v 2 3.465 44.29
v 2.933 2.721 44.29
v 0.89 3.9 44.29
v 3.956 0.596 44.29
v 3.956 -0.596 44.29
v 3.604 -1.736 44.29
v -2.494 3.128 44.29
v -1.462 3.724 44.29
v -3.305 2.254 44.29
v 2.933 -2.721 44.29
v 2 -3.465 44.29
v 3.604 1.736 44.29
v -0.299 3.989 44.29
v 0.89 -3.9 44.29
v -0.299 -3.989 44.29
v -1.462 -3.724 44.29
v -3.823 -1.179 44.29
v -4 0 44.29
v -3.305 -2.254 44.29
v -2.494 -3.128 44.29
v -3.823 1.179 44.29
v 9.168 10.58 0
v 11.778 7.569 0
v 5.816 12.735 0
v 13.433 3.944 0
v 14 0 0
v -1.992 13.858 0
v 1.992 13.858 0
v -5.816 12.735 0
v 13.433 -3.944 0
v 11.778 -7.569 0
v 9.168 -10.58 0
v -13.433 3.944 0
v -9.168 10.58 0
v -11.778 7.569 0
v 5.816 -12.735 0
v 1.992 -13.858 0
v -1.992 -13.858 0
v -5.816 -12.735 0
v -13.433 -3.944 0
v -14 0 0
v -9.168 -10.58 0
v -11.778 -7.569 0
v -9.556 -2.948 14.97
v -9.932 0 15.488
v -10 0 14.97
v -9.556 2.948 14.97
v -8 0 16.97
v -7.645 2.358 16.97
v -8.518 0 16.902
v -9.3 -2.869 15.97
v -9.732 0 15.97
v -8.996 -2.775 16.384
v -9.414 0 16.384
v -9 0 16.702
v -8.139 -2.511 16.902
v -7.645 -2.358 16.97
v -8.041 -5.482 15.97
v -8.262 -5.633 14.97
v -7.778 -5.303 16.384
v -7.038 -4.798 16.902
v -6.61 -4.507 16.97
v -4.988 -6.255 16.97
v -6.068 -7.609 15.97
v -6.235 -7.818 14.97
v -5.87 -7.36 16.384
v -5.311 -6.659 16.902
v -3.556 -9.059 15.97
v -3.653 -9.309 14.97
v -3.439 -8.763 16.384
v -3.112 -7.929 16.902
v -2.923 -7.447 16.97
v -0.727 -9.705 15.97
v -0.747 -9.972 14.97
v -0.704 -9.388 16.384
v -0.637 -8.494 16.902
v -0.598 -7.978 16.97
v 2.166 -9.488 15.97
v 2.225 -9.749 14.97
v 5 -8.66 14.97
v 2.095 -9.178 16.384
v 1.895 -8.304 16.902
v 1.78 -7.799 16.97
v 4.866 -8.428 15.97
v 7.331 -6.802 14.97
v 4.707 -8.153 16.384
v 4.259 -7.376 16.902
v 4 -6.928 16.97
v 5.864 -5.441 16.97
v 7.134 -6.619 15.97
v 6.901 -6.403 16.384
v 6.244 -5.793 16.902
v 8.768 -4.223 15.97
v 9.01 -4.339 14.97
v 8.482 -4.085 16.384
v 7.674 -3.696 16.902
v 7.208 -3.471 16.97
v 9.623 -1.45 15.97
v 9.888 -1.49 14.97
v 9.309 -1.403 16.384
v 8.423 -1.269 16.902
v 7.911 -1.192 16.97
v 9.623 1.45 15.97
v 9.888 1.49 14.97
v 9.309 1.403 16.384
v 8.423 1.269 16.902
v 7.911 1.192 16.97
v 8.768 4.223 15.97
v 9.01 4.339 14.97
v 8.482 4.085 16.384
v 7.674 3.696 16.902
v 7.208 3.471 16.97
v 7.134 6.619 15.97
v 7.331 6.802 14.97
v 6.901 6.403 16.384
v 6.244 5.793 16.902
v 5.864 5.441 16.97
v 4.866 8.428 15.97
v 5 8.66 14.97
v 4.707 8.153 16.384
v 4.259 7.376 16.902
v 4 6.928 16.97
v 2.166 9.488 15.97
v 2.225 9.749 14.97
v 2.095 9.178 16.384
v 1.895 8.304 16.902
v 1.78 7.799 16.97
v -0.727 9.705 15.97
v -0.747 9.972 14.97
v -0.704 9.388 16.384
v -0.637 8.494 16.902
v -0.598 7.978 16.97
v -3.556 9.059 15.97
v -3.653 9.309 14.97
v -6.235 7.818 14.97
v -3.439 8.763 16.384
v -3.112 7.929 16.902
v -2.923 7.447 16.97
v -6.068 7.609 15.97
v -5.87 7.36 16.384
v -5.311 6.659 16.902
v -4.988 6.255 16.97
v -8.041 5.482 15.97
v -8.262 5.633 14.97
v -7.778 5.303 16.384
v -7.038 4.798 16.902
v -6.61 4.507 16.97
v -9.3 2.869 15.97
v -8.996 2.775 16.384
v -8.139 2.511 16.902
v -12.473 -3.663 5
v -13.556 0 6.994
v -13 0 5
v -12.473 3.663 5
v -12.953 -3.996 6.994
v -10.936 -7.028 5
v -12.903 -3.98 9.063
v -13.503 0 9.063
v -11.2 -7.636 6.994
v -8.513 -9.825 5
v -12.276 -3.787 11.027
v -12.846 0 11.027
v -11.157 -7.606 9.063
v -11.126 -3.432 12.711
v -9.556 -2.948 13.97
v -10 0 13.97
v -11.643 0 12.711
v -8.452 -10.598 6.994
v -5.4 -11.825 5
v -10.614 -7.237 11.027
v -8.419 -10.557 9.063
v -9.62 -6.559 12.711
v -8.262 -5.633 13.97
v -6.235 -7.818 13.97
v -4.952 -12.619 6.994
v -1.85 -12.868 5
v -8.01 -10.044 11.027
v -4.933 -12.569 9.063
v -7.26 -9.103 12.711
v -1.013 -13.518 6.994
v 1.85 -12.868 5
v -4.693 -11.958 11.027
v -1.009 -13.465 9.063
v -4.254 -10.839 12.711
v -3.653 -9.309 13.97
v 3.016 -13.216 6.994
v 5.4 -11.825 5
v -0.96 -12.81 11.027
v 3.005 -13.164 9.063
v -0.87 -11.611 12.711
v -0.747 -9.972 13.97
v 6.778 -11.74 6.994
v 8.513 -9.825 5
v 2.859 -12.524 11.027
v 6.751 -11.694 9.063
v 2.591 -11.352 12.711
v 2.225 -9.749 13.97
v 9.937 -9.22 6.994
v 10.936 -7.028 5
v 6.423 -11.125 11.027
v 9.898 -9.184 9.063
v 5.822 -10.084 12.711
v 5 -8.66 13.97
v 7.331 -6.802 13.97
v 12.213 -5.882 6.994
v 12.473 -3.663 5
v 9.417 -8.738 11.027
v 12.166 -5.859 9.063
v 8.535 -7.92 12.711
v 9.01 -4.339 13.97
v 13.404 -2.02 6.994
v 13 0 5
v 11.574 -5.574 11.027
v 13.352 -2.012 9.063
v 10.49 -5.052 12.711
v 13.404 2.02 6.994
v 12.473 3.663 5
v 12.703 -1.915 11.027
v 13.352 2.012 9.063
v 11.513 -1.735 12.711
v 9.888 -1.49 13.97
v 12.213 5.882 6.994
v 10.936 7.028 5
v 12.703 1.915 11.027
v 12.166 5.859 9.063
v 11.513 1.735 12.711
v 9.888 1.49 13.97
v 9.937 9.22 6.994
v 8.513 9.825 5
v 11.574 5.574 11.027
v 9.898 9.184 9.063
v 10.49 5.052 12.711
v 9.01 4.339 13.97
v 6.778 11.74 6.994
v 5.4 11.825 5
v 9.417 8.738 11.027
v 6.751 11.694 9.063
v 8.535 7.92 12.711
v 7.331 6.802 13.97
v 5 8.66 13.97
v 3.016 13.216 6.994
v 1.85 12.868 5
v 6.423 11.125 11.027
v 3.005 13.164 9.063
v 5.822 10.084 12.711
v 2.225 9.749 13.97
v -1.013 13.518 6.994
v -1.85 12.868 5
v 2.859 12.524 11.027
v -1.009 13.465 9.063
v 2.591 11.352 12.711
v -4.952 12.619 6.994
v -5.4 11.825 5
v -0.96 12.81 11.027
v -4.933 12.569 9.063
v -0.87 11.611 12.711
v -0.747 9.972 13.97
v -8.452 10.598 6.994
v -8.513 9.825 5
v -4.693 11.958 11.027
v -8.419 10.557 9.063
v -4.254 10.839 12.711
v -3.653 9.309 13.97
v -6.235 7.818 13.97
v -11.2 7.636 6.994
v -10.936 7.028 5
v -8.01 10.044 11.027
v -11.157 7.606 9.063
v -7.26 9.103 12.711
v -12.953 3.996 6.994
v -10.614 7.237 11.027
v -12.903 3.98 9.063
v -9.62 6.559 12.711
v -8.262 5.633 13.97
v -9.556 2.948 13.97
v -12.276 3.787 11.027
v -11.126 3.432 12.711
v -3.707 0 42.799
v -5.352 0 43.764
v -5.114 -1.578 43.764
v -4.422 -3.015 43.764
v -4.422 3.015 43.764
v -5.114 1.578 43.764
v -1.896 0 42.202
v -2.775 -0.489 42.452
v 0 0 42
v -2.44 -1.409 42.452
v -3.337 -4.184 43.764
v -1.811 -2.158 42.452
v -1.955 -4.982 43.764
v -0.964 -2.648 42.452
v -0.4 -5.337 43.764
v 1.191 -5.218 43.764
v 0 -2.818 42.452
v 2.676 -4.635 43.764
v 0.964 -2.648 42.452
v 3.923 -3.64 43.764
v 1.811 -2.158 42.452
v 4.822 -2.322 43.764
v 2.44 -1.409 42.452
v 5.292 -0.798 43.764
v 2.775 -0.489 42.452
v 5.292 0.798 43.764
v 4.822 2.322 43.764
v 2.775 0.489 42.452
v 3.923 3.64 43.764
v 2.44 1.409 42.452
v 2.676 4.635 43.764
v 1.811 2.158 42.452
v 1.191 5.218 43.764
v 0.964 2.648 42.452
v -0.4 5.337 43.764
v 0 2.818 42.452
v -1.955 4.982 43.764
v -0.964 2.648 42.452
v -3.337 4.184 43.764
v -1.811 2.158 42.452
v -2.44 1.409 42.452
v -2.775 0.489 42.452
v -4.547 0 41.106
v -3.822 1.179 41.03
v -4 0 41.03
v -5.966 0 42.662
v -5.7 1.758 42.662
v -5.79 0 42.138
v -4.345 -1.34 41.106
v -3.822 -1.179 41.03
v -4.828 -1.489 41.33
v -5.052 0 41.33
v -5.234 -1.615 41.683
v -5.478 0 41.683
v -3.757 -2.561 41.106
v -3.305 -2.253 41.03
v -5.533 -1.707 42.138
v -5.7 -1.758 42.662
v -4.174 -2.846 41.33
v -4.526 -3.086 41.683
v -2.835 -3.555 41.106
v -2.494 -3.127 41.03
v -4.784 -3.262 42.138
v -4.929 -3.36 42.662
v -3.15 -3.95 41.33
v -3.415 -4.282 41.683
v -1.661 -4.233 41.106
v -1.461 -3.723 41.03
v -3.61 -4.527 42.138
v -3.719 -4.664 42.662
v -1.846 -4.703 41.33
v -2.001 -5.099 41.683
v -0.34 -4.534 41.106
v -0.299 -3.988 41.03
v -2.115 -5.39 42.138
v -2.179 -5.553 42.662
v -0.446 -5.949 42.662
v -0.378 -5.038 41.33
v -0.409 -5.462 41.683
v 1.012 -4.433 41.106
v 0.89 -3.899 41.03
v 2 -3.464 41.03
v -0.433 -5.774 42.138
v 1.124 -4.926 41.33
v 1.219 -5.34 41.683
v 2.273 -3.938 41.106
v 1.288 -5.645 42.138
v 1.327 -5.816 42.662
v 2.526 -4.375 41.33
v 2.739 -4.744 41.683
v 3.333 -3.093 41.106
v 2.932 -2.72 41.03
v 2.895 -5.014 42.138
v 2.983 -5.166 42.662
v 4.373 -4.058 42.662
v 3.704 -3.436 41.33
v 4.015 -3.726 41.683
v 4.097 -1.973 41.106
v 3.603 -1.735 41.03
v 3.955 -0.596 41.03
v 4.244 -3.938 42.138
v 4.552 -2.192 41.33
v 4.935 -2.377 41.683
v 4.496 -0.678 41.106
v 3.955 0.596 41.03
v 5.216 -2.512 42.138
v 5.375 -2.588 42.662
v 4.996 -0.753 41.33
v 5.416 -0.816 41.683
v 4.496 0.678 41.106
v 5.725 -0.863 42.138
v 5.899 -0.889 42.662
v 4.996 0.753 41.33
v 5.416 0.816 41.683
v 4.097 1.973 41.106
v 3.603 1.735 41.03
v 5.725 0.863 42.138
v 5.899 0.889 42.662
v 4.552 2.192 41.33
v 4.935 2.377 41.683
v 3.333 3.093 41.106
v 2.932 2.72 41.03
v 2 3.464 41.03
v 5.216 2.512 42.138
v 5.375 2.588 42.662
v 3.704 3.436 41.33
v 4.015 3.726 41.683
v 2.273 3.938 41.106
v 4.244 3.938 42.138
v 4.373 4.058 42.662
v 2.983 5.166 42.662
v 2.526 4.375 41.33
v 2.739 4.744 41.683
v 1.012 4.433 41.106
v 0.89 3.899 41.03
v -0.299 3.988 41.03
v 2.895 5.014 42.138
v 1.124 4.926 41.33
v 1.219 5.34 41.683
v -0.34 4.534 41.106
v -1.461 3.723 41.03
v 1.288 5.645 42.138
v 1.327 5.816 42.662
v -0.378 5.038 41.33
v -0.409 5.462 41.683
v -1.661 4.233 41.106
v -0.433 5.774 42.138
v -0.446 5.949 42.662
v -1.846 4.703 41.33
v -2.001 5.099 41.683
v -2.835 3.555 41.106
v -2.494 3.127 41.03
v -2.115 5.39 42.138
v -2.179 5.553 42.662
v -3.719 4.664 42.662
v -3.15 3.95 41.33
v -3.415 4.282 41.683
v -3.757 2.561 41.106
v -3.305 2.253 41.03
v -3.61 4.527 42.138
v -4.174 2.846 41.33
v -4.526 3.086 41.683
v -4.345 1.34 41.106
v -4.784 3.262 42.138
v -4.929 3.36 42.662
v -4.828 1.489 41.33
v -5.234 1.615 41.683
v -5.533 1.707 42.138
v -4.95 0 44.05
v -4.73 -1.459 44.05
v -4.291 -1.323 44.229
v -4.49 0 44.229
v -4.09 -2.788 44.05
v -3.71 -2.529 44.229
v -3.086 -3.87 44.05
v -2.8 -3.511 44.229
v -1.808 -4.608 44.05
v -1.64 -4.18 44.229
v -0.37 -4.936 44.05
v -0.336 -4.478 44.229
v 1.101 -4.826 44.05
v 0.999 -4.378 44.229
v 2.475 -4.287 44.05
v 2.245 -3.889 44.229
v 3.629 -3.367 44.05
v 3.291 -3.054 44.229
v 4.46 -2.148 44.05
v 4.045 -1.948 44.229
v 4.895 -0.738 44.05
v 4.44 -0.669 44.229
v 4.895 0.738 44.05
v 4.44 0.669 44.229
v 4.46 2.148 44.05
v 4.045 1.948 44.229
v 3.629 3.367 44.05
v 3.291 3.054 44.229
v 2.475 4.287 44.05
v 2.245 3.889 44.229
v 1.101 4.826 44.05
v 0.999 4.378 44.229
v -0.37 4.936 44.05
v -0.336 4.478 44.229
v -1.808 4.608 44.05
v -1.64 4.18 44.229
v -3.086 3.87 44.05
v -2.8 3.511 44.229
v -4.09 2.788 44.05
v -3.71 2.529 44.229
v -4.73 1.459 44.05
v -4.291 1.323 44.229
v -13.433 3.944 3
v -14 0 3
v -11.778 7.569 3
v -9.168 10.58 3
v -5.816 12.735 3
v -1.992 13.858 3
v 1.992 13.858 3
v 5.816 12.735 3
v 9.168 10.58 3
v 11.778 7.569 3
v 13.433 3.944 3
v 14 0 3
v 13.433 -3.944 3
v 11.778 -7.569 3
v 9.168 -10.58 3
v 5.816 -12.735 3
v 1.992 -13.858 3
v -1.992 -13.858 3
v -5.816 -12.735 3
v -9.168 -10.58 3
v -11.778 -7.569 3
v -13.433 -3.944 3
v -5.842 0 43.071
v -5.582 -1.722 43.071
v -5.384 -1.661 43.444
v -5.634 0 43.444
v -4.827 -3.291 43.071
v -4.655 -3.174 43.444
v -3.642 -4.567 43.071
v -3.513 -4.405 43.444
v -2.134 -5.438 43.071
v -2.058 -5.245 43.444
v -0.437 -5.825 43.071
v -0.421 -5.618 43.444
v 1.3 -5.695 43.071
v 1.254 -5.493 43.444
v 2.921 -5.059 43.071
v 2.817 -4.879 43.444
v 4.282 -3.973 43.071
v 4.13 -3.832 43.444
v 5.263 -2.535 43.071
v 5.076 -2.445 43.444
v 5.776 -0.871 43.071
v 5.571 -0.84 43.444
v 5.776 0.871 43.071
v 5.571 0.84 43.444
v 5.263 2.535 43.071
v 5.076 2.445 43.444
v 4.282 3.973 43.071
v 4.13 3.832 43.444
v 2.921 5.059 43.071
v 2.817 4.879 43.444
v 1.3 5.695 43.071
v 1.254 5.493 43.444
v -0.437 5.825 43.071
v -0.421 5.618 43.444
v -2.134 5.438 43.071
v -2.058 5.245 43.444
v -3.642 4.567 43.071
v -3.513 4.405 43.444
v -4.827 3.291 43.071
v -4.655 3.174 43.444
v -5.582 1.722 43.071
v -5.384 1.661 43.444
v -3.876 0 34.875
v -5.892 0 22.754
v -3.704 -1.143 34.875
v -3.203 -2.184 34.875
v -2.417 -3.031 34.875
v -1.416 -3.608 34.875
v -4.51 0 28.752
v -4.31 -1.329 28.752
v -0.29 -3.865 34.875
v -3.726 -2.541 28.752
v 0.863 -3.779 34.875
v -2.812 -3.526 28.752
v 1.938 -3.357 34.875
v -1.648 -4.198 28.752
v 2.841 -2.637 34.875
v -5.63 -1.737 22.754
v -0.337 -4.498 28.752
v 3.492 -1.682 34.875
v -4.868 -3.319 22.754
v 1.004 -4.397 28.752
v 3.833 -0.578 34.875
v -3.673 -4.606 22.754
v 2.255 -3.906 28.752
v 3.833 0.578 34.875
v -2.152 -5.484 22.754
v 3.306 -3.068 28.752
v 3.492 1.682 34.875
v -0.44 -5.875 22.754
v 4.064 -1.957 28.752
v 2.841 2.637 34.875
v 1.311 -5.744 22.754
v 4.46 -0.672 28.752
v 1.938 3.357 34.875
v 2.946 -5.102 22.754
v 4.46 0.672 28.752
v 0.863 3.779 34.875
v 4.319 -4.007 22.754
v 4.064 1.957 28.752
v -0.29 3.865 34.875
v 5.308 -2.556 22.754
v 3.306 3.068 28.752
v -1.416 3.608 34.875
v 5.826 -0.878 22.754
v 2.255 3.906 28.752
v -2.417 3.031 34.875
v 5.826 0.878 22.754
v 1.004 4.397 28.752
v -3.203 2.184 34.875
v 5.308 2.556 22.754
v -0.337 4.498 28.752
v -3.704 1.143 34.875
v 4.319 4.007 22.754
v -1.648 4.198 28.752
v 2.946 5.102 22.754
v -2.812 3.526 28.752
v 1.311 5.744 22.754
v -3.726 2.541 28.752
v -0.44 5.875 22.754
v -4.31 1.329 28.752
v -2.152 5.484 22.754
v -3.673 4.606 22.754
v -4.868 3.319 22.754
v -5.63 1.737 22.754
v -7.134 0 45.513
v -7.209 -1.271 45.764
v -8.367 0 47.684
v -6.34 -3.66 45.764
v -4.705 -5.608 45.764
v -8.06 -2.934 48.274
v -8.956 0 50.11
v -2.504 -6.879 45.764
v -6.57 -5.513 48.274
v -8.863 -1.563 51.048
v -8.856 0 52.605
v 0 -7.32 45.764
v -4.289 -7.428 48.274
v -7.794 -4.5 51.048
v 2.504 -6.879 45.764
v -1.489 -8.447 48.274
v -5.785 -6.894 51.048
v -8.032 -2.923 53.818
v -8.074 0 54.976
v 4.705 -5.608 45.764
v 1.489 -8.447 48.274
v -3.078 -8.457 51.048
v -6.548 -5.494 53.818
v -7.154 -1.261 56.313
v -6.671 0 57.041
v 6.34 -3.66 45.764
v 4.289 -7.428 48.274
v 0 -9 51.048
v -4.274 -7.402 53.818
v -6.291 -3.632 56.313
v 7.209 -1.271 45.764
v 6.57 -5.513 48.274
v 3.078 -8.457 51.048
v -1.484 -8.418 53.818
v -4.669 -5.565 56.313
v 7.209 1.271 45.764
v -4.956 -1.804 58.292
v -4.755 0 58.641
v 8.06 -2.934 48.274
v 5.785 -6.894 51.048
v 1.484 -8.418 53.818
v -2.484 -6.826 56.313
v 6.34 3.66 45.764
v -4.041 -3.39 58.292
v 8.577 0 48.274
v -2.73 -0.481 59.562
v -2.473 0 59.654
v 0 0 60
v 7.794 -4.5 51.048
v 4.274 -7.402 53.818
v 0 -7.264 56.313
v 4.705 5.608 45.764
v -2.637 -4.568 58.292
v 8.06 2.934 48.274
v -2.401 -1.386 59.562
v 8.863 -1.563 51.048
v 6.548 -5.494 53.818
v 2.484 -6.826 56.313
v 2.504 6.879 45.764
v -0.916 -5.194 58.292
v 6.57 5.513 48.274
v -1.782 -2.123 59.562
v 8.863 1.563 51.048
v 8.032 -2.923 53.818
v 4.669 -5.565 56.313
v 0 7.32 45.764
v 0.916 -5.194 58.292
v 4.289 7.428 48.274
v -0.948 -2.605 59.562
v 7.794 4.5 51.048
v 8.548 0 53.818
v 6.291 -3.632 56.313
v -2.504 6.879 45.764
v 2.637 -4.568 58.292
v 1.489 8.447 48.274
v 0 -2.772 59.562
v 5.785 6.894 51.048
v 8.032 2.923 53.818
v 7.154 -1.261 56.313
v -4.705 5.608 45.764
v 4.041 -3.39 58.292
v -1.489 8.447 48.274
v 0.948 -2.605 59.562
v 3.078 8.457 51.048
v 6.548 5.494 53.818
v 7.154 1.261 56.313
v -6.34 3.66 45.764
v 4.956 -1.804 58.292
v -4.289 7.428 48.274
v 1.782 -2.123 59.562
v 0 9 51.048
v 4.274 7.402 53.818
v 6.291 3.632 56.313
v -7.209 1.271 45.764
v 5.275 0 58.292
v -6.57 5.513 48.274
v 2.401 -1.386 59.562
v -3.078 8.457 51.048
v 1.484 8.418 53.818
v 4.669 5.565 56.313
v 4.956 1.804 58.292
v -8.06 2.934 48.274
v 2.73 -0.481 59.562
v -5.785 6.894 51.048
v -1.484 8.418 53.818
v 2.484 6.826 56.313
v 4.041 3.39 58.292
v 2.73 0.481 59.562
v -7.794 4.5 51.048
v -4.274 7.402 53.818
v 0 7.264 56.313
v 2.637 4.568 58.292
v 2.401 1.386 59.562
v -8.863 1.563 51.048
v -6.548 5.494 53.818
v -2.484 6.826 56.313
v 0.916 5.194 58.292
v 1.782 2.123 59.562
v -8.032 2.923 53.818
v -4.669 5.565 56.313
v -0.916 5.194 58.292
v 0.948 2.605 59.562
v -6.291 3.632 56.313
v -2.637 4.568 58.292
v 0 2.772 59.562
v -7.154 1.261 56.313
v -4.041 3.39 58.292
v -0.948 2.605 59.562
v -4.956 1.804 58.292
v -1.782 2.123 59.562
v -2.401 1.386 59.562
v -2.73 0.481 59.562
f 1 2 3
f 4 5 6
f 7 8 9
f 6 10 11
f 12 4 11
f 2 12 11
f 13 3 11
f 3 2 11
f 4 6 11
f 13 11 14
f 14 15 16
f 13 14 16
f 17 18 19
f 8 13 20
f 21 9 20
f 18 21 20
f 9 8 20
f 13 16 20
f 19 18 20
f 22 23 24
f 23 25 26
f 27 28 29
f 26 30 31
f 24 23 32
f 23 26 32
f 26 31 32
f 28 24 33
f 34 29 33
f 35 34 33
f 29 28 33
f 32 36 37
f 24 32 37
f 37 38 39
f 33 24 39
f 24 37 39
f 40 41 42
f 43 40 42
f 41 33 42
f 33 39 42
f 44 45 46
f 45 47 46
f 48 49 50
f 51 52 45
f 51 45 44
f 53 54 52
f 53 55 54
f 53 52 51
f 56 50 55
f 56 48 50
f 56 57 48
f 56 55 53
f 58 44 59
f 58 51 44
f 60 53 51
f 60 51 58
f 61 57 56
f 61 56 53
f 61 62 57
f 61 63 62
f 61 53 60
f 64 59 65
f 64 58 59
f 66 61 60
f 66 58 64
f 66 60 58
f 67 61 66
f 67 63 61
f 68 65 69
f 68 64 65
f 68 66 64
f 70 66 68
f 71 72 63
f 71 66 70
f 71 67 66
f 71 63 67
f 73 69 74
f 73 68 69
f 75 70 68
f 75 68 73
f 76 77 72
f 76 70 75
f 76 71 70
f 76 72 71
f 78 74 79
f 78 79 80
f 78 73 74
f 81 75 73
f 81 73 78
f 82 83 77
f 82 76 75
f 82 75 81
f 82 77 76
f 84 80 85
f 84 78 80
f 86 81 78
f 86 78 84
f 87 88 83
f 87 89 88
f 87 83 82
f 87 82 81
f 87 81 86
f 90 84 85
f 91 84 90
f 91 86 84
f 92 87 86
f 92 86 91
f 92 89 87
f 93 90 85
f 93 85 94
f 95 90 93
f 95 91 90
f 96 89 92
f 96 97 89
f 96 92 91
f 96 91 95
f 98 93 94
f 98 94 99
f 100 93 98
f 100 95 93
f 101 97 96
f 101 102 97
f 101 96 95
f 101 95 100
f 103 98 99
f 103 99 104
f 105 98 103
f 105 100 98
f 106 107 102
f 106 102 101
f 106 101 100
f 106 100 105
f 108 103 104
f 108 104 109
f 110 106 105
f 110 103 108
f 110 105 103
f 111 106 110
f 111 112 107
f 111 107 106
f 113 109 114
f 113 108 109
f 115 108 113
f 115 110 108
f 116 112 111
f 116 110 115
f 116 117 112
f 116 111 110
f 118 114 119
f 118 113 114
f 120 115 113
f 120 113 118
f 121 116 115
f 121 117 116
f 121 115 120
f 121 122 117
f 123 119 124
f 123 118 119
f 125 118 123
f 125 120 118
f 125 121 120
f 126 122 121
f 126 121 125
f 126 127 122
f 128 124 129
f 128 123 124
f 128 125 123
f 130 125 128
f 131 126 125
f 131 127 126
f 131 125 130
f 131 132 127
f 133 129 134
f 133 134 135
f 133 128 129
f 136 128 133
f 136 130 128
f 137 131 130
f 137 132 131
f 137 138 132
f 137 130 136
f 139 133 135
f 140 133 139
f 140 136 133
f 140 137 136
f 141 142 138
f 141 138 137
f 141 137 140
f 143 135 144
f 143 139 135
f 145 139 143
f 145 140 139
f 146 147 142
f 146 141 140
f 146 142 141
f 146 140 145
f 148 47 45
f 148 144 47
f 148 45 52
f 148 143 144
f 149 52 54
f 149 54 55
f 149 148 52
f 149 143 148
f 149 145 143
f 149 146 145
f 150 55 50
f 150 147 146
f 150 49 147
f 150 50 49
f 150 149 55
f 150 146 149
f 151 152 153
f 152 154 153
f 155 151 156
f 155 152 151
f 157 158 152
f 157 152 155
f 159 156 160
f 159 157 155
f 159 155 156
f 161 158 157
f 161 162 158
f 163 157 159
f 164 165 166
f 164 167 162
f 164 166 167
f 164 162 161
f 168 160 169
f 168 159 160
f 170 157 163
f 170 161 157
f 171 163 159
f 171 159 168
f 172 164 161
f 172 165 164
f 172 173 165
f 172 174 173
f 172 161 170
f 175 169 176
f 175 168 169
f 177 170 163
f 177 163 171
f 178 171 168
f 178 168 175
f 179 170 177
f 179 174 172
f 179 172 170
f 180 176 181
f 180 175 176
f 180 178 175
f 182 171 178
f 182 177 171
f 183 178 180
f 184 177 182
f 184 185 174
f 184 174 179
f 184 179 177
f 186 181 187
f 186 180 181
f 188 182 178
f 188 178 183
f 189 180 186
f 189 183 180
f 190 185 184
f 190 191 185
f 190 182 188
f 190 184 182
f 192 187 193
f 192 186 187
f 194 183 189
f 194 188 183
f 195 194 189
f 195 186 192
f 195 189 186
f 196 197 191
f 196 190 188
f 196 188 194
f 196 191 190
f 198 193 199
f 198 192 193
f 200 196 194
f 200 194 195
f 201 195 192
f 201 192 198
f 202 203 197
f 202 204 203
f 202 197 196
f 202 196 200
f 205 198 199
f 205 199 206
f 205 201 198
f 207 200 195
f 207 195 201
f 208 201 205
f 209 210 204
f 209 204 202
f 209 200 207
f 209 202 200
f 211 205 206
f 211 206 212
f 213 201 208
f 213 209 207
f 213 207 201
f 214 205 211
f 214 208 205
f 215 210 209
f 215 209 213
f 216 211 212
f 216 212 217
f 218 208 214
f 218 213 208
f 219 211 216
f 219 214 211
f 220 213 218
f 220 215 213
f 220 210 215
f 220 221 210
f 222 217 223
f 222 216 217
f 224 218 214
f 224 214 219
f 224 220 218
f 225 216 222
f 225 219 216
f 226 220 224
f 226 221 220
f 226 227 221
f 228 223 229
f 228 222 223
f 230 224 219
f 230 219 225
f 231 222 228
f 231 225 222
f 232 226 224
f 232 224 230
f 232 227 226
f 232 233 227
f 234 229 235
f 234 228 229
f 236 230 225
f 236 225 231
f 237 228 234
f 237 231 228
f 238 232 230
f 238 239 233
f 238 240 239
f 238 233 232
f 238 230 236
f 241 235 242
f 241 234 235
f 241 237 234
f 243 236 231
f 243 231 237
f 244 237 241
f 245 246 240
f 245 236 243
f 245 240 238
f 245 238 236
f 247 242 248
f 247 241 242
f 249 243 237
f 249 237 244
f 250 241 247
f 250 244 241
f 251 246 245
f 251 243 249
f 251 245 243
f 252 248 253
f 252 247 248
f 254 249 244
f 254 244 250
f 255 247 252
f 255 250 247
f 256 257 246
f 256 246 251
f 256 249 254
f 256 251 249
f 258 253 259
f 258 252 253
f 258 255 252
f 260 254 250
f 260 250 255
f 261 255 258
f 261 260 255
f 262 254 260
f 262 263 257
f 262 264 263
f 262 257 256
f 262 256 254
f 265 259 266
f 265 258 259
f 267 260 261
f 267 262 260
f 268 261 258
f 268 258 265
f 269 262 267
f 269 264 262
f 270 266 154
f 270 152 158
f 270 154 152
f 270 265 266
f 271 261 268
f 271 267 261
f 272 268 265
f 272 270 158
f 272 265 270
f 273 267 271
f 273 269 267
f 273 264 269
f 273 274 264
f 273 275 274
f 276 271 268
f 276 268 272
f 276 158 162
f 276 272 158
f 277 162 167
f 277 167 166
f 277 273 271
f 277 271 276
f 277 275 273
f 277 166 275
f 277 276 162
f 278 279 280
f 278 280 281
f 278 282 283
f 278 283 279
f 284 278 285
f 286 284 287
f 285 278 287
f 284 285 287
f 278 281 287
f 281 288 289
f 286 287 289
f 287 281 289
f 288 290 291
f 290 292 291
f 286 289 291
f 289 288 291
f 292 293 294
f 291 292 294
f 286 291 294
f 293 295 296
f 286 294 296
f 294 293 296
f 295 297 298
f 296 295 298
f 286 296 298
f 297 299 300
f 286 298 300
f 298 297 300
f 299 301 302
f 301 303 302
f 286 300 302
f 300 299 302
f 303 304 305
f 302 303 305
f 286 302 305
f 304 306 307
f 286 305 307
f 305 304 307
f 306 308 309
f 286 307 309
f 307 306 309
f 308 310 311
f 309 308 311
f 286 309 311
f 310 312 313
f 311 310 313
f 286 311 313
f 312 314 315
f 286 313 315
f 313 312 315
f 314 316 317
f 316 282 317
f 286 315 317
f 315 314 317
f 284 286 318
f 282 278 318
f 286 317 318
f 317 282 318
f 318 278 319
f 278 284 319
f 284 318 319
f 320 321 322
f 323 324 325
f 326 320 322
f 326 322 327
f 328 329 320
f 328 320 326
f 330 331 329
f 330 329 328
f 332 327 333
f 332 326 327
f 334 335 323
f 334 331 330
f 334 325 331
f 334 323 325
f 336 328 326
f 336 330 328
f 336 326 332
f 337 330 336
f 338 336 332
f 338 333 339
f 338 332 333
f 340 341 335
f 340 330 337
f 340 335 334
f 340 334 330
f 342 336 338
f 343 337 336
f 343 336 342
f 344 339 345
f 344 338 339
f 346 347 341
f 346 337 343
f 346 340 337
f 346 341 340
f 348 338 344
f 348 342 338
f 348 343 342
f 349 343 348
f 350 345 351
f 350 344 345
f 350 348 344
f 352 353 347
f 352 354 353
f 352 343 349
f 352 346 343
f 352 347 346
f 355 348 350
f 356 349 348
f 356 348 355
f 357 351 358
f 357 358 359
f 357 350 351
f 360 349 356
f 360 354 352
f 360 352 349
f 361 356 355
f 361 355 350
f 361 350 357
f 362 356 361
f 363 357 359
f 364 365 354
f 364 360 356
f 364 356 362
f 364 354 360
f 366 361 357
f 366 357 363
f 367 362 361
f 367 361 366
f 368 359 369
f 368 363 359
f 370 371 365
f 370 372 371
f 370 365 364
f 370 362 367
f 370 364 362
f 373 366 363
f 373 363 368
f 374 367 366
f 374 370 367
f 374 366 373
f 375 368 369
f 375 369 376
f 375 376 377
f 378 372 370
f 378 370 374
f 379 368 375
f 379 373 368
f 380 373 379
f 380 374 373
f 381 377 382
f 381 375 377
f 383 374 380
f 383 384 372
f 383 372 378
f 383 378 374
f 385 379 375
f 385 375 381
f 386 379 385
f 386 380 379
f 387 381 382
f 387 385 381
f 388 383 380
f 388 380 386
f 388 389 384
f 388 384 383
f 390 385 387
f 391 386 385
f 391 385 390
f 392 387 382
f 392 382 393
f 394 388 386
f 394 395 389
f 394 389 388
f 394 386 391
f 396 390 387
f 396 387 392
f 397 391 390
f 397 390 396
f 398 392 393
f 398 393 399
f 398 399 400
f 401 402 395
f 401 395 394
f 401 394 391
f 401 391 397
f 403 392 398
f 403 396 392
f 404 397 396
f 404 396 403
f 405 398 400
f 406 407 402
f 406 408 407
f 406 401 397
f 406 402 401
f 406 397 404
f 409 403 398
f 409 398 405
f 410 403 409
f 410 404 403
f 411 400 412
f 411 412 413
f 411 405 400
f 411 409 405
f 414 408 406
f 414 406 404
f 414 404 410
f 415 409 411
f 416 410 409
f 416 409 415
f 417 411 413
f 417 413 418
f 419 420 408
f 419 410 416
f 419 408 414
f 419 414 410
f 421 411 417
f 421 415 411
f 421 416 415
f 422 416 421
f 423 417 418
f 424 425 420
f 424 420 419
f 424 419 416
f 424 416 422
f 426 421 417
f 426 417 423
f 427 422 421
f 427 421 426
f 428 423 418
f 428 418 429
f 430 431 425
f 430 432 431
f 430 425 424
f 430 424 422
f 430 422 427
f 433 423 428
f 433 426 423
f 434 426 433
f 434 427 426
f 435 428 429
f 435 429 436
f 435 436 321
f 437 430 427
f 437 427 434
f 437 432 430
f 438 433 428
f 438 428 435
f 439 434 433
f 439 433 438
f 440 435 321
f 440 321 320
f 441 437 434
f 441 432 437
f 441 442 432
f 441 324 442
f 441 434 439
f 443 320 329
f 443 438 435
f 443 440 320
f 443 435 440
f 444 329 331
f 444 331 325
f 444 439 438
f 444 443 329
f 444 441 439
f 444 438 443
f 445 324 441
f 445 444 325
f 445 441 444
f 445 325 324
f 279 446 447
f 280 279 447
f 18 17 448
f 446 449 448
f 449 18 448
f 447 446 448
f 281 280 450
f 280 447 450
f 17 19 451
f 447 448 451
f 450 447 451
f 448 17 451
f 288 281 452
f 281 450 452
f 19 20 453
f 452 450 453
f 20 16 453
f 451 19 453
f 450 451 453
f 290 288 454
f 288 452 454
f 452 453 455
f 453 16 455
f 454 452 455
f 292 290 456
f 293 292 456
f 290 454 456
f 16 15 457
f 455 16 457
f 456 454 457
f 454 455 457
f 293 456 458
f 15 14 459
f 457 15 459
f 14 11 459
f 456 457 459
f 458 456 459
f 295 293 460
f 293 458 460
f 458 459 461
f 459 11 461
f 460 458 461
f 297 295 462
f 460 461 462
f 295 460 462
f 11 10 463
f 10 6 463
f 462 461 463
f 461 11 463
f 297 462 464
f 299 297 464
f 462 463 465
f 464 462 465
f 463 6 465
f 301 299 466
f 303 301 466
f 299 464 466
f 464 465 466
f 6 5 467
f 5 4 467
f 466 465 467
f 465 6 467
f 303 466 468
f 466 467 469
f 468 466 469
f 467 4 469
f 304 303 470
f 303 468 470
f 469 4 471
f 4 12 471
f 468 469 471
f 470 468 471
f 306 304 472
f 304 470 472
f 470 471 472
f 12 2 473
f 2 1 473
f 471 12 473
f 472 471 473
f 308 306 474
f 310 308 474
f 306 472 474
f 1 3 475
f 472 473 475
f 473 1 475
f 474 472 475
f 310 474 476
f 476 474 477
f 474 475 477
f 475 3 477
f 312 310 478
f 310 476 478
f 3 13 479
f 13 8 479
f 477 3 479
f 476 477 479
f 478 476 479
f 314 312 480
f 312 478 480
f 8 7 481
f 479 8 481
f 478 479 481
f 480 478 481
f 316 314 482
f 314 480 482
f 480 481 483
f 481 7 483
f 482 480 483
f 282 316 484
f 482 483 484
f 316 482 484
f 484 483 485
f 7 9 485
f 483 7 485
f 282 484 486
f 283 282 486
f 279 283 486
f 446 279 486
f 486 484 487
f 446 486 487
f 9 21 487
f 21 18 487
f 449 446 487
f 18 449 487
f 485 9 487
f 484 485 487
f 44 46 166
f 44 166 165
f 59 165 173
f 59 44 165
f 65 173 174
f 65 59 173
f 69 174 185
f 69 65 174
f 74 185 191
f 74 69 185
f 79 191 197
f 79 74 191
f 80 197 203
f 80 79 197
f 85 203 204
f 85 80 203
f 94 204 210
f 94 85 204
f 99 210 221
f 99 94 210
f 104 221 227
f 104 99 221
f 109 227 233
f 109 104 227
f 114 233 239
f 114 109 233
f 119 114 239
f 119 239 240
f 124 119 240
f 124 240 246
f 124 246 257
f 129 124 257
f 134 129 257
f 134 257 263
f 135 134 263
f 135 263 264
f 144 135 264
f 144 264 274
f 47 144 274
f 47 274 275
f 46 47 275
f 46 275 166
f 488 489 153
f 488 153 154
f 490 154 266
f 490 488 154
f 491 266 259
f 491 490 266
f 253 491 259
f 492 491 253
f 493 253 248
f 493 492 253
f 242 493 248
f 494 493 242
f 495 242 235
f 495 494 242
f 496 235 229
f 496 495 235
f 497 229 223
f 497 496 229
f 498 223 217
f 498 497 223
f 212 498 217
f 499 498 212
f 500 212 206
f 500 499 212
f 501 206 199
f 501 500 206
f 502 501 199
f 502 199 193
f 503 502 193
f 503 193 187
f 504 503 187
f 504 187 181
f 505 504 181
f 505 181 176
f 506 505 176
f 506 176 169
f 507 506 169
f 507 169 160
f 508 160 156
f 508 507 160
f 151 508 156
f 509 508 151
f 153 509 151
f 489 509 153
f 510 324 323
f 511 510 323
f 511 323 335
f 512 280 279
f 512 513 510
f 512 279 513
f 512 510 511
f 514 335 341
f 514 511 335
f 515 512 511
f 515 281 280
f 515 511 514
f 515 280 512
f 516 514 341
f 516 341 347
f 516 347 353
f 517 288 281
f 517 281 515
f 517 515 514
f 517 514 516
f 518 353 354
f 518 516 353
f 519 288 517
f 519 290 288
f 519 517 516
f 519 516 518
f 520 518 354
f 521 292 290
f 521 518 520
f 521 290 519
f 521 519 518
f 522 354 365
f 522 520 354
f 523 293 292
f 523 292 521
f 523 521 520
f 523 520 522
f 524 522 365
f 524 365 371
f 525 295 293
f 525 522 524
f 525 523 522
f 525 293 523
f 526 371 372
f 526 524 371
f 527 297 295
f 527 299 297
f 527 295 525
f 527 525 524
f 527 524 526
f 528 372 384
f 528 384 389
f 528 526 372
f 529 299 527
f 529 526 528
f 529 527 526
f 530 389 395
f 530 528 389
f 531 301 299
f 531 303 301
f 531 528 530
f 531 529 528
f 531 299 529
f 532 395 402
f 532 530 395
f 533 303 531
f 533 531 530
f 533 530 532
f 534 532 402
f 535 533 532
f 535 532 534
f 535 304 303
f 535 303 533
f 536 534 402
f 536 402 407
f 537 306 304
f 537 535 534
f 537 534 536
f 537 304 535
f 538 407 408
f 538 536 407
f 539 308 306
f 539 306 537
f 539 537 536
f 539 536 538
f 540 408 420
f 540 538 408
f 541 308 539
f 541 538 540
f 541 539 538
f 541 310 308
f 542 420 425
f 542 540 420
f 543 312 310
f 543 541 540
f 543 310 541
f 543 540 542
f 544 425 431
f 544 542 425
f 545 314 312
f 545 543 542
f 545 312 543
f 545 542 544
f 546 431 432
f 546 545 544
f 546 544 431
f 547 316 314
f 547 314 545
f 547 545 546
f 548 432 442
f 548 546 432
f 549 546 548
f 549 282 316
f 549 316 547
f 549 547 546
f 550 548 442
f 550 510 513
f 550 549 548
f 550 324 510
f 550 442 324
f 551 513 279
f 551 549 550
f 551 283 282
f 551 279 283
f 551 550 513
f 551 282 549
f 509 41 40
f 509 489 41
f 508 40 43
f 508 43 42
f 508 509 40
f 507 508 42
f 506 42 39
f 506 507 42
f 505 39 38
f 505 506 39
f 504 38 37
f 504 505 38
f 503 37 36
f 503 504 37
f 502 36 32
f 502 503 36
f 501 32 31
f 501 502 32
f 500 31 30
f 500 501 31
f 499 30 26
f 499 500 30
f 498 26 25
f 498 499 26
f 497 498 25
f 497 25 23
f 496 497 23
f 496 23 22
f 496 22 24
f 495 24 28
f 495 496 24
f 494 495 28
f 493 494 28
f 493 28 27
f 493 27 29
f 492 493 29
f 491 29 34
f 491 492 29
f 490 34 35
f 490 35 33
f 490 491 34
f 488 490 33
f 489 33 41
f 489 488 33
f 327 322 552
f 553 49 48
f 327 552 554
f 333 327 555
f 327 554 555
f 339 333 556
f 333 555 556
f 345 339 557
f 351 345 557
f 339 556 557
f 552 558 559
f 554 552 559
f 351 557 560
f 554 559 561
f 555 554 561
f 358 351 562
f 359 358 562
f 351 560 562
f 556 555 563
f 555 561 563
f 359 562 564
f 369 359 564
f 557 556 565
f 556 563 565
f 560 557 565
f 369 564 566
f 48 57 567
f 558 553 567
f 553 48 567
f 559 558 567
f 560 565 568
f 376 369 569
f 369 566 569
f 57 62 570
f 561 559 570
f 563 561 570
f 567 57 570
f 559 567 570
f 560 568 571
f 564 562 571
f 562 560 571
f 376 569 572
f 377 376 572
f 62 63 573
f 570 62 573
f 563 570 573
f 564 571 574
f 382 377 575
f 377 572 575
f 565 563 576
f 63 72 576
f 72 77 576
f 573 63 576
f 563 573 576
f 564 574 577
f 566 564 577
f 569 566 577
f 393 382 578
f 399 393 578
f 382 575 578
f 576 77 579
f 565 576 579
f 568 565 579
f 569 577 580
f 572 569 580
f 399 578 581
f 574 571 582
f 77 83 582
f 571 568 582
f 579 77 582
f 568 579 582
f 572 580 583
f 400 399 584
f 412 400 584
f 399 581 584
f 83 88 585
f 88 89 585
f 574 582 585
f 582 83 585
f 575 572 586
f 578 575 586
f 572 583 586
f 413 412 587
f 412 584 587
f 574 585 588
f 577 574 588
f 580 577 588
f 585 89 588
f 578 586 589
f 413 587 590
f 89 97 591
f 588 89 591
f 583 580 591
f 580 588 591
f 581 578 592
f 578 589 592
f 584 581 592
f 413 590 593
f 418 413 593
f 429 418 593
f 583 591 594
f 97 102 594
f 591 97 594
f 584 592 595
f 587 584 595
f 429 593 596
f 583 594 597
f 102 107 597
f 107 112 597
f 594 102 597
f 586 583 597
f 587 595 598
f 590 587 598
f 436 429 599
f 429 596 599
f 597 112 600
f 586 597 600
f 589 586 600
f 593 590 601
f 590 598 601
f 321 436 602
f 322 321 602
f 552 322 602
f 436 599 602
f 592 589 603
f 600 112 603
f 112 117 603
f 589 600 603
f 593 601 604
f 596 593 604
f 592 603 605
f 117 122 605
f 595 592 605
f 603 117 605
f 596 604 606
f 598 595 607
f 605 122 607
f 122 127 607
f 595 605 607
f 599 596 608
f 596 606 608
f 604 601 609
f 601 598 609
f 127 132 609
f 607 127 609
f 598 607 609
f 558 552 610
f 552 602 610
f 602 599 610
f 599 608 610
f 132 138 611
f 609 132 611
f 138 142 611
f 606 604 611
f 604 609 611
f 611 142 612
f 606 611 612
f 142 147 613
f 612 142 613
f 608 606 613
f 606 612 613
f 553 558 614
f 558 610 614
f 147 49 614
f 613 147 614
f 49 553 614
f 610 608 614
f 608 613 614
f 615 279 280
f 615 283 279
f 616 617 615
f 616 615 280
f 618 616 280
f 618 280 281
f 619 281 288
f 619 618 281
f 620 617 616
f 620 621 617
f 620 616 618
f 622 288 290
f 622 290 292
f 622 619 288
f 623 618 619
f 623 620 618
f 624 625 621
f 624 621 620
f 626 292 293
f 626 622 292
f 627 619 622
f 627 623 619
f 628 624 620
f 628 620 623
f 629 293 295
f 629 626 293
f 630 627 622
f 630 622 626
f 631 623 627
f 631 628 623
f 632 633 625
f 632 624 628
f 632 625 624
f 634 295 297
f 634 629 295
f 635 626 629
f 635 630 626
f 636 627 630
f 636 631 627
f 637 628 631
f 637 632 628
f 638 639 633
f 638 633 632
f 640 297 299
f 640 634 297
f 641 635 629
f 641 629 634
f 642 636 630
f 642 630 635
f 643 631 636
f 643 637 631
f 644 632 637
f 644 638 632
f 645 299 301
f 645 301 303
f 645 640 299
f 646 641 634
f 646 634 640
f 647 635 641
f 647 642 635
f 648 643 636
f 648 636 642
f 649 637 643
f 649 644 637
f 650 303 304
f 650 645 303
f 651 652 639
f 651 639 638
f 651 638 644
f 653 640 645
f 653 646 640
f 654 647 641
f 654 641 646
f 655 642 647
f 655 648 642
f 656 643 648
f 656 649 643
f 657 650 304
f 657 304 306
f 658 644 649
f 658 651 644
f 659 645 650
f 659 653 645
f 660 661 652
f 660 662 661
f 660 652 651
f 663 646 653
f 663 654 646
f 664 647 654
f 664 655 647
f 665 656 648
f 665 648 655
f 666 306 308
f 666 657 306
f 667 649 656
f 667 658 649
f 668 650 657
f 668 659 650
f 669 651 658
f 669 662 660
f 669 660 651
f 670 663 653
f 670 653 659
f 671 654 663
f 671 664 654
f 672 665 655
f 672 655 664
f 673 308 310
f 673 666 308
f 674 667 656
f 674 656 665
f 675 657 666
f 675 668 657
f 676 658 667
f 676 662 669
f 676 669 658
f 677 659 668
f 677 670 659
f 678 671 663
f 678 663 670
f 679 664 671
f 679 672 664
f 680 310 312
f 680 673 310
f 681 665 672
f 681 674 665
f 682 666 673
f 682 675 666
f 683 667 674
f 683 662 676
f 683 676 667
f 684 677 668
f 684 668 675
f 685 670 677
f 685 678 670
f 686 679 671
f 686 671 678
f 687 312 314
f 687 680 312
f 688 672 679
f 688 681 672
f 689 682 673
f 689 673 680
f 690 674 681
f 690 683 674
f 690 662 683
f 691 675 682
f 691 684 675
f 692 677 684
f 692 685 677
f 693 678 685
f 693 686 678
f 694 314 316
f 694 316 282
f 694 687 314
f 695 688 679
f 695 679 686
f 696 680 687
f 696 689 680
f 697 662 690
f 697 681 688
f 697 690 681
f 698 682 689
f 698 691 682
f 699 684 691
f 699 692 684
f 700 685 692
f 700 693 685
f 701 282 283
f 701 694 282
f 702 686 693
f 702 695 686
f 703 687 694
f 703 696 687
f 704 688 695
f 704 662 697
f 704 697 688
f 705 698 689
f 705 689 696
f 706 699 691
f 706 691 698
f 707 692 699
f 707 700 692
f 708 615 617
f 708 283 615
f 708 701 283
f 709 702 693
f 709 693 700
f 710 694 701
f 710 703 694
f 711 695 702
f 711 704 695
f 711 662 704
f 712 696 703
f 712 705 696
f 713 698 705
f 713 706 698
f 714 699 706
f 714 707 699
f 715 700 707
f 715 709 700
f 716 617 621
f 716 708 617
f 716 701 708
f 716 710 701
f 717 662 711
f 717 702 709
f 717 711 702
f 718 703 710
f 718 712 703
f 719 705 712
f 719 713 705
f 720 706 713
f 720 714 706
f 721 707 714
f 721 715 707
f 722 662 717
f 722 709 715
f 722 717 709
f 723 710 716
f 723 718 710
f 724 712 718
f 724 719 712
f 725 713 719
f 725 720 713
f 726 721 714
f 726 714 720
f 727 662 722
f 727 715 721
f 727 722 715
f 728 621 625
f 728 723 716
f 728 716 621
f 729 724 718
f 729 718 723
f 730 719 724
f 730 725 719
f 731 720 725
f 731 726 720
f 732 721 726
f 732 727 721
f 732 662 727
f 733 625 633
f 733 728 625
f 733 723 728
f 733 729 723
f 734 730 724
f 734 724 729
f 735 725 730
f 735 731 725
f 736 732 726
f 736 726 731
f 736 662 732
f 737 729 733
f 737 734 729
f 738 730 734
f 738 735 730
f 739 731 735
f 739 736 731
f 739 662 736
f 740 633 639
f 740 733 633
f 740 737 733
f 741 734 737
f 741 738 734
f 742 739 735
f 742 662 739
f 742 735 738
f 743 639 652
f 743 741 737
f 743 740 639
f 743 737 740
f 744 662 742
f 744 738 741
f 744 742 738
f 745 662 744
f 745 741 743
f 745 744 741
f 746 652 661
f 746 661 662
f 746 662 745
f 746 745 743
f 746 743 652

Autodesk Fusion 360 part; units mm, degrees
sketch "Sketch1" plane through (0, 0, 0) normal (0, 1, 0) x (1, 0, 0)
  line L0 (0, 0) -> (0, -60)
  line L1 (0, -60) -> (0, -51)
  circle A0 centre (0, -51) radius 9
  line L2 (50, -60) -> (50, 0)
  line L3 (25, -60) -> (25, -44.29)
  line L4 (5.998, -44.29) -> (-4.0005, -44.29)
  line L5 (5.998, -44.29) -> (5.998, -41.03)
  line L6 (5.998, -41.03) -> (-3.9995, -41.03)
  arc A1 (-3.9995, -41.03) -> (-5.9655, -42.6624) centre (-3.9995, -43.03) ccw
  arc A2 (-5.9655, -42.6624) -> (-4.0005, -44.29) centre (-4.0005, -42.29) ccw
  line L7 (0, -41.03) -> (0, -16.97)
  line L8 (0, 0) -> (14, 0)
  line L9 (14, 0) -> (-14, 0)
  line L10 (-14, 0) -> (-14, -3)
  line L11 (-14, -3) -> (14, -3)
  line L12 (14, -3) -> (14, 0)
  line L13 (0, -3) -> (0, -5)
  line L14 (0, -5) -> (13, -5)
  line L15 (13, -5) -> (-13, -5)
  line L16 (13, -5) -> (14, -3)
  line L17 (-13, -5) -> (-14, -3)
  line L18 (0, -5) -> (0, -13.97)
  line L19 (0, -13.97) -> (10, -13.97)
  line L20 (10, -13.97) -> (-10, -13.97)
  line L21 (-10, -13.97) -> (-10, -14.97)
  line L22 (-10, -14.97) -> (10, -14.97)
  line L23 (10, -14.97) -> (10, -13.97)
  arc A3 (-13, -5) -> (-10, -13.97) centre (-6.6188, -7.8525) ccw
  line L24 (8, -16.97) -> (-8, -16.97)
  arc A4 (-10, -14.97) -> (-8, -16.97) centre (-8, -14.97) ccw
  arc A5 (-3.9995, -41.03) -> (-8, -16.97) centre (-53.8331, -36.9532) ccw
  line L25 (0, 0) -> (0, -65)
  point P0 (-6.002, -41.03)
  dimension "d1" = 60
  dimension "d3" = 9
  dimension "d4" = 18
  dimension "d5" = 15.71
  dimension "d6" = 3.26
  dimension "d7" = 12
  dimension "d8" = 2
  dimension "d9" = 2
  dimension "d10" = 24.06
  dimension "d12" = 14
  dimension "d14" = 3
  dimension "d15" = 28
  dimension "d16" = 2
  dimension "d17" = 13
  dimension "d18" = 26
  dimension "d19" = 8.97
  dimension "d20" = 10
  dimension "d21" = 20
  dimension "d22" = 1
  dimension "d23" = 8
  dimension "d24" = 16
  dimension "d25" = 2
  dimension "d26" = 50
revolve "Revolve1" add sketch "Sketch1" angle 360 about axis through (0, 0, 0) along (0, 0, 1) second angle 360 contours L0 L9 L10 L11 L25 | L0 L11 L13 L15 L17 L25 | L0 L15 L18 L20 A3 L25 | L0 L20 L21 L22 L25 | L0 L22 L24 A4 L25 | L0 L6 L7 L24 A5 L25 | L0 A0 L6 A1 A2 L25 | L0 L1 A0 L4 A2 L25
